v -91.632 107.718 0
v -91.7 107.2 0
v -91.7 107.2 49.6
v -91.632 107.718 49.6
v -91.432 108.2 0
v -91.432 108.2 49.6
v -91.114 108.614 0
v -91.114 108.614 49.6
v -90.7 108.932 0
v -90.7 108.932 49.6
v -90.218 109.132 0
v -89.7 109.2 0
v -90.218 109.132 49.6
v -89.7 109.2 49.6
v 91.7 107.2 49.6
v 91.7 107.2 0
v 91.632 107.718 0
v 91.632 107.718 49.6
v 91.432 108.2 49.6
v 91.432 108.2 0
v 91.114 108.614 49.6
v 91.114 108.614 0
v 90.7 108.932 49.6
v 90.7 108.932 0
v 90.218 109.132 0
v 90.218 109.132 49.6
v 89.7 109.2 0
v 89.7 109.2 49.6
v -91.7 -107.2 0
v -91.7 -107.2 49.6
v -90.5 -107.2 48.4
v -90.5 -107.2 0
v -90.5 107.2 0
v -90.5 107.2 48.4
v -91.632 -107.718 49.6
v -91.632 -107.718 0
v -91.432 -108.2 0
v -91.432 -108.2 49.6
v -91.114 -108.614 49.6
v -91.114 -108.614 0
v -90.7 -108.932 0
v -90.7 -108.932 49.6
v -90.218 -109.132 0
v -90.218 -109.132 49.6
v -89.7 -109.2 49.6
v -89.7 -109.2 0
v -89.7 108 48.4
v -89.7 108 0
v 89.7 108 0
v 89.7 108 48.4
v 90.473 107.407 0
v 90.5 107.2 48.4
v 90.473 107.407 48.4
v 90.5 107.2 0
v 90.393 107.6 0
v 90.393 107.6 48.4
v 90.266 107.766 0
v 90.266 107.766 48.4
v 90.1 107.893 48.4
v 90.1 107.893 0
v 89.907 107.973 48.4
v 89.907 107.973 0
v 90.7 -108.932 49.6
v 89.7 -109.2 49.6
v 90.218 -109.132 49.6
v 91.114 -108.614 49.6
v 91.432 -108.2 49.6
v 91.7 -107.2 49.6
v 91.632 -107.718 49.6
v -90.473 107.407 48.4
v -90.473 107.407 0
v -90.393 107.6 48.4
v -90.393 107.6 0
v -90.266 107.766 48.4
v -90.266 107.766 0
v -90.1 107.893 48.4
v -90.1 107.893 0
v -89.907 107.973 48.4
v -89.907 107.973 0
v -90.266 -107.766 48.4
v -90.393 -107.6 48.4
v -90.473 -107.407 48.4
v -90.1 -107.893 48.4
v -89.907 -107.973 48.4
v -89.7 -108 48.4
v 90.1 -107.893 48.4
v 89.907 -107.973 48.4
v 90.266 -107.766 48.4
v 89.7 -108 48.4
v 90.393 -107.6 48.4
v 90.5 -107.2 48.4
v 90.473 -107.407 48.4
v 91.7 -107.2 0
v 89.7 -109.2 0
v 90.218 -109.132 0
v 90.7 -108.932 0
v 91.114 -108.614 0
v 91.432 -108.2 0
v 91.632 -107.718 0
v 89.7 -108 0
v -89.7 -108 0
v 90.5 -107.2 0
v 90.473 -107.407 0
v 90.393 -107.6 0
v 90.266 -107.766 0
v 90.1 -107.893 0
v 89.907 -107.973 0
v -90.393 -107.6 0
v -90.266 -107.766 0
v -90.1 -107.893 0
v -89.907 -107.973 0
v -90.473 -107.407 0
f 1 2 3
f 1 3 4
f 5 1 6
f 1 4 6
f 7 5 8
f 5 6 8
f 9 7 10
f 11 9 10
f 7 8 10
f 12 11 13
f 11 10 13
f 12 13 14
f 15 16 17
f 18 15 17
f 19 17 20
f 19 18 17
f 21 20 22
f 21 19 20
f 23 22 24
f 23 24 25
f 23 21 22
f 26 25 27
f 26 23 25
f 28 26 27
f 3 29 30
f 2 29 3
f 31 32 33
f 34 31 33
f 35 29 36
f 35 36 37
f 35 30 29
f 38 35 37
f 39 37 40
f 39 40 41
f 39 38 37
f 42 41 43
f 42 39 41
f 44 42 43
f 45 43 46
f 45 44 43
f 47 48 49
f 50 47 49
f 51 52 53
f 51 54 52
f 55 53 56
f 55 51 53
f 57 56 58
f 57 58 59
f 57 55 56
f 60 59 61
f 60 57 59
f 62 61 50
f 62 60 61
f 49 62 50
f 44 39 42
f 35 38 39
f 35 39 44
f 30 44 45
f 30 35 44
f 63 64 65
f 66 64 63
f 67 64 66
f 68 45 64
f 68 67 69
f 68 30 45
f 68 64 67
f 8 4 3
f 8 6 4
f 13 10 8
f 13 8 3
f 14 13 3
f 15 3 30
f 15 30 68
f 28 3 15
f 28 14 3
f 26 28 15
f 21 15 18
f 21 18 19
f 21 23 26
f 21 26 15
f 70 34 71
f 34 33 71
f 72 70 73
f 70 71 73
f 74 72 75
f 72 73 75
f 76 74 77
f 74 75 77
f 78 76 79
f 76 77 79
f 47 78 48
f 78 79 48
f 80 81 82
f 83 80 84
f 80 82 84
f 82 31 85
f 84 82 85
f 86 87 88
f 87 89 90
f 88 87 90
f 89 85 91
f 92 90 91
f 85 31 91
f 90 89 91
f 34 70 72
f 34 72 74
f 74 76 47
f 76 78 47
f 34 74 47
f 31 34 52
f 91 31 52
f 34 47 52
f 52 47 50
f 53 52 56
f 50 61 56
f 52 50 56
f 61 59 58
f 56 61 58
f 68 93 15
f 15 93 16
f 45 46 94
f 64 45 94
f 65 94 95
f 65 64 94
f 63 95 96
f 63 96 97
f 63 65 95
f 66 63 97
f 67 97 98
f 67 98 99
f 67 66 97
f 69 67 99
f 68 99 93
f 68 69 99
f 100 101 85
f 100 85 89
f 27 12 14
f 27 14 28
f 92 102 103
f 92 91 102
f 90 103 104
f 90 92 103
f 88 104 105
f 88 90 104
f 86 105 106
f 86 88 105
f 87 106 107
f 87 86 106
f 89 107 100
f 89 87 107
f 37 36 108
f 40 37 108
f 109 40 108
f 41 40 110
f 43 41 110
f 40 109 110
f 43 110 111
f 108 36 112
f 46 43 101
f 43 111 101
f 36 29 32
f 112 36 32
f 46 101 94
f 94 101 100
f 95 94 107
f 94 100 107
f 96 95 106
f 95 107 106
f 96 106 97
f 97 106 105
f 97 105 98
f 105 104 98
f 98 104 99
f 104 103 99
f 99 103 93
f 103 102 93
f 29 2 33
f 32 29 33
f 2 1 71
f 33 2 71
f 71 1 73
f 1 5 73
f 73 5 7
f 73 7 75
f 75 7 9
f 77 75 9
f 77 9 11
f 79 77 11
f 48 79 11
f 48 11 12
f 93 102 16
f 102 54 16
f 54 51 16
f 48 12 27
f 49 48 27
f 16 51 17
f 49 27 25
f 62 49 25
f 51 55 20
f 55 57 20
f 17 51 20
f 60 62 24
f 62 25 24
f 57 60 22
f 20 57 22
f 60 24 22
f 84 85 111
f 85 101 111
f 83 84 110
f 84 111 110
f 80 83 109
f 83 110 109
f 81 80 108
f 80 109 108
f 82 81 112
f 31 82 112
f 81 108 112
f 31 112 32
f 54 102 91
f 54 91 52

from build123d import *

# Parameters (mm, degrees)
F0_W     = 183.4
F0_H     = 218.4
F1_DEPTH = 49.6
F2_T     = -1.2
F3_R     = 2
F4_R     = 0.8


with BuildPart() as f1:
    # F0 (on Top) → F1 (new body)
    with BuildSketch(Plane.XY):
        Rectangle(F0_W, F0_H)
    extrude(amount=F1_DEPTH)

    # F2
    f2_openings = [f1.faces().sort_by_distance(p)[0] for p in [
        (0, 0, 0),
    ]]
    offset(amount=F2_T, openings=f2_openings)

    # F3
    f3_edges = [f1.edges().sort_by_distance(p)[0] for p in [
        (-91.7, -109.2, 24.8),
        (-91.7, 109.2, 24.8),
        (91.7, 109.2, 24.8),
        (91.7, -109.2, 24.8),
    ]]
    fillet(f3_edges, radius=F3_R)

    # F4
    f4_edges = [f1.edges().sort_by_distance(p)[0] for p in [
        (-90.5, -108, 24.2),
        (90.5, -108, 24.2),
        (90.5, 108, 24.2),
        (-90.5, 108, 24.2),
    ]]
    fillet(f4_edges, radius=F4_R)


solid = f1.part
